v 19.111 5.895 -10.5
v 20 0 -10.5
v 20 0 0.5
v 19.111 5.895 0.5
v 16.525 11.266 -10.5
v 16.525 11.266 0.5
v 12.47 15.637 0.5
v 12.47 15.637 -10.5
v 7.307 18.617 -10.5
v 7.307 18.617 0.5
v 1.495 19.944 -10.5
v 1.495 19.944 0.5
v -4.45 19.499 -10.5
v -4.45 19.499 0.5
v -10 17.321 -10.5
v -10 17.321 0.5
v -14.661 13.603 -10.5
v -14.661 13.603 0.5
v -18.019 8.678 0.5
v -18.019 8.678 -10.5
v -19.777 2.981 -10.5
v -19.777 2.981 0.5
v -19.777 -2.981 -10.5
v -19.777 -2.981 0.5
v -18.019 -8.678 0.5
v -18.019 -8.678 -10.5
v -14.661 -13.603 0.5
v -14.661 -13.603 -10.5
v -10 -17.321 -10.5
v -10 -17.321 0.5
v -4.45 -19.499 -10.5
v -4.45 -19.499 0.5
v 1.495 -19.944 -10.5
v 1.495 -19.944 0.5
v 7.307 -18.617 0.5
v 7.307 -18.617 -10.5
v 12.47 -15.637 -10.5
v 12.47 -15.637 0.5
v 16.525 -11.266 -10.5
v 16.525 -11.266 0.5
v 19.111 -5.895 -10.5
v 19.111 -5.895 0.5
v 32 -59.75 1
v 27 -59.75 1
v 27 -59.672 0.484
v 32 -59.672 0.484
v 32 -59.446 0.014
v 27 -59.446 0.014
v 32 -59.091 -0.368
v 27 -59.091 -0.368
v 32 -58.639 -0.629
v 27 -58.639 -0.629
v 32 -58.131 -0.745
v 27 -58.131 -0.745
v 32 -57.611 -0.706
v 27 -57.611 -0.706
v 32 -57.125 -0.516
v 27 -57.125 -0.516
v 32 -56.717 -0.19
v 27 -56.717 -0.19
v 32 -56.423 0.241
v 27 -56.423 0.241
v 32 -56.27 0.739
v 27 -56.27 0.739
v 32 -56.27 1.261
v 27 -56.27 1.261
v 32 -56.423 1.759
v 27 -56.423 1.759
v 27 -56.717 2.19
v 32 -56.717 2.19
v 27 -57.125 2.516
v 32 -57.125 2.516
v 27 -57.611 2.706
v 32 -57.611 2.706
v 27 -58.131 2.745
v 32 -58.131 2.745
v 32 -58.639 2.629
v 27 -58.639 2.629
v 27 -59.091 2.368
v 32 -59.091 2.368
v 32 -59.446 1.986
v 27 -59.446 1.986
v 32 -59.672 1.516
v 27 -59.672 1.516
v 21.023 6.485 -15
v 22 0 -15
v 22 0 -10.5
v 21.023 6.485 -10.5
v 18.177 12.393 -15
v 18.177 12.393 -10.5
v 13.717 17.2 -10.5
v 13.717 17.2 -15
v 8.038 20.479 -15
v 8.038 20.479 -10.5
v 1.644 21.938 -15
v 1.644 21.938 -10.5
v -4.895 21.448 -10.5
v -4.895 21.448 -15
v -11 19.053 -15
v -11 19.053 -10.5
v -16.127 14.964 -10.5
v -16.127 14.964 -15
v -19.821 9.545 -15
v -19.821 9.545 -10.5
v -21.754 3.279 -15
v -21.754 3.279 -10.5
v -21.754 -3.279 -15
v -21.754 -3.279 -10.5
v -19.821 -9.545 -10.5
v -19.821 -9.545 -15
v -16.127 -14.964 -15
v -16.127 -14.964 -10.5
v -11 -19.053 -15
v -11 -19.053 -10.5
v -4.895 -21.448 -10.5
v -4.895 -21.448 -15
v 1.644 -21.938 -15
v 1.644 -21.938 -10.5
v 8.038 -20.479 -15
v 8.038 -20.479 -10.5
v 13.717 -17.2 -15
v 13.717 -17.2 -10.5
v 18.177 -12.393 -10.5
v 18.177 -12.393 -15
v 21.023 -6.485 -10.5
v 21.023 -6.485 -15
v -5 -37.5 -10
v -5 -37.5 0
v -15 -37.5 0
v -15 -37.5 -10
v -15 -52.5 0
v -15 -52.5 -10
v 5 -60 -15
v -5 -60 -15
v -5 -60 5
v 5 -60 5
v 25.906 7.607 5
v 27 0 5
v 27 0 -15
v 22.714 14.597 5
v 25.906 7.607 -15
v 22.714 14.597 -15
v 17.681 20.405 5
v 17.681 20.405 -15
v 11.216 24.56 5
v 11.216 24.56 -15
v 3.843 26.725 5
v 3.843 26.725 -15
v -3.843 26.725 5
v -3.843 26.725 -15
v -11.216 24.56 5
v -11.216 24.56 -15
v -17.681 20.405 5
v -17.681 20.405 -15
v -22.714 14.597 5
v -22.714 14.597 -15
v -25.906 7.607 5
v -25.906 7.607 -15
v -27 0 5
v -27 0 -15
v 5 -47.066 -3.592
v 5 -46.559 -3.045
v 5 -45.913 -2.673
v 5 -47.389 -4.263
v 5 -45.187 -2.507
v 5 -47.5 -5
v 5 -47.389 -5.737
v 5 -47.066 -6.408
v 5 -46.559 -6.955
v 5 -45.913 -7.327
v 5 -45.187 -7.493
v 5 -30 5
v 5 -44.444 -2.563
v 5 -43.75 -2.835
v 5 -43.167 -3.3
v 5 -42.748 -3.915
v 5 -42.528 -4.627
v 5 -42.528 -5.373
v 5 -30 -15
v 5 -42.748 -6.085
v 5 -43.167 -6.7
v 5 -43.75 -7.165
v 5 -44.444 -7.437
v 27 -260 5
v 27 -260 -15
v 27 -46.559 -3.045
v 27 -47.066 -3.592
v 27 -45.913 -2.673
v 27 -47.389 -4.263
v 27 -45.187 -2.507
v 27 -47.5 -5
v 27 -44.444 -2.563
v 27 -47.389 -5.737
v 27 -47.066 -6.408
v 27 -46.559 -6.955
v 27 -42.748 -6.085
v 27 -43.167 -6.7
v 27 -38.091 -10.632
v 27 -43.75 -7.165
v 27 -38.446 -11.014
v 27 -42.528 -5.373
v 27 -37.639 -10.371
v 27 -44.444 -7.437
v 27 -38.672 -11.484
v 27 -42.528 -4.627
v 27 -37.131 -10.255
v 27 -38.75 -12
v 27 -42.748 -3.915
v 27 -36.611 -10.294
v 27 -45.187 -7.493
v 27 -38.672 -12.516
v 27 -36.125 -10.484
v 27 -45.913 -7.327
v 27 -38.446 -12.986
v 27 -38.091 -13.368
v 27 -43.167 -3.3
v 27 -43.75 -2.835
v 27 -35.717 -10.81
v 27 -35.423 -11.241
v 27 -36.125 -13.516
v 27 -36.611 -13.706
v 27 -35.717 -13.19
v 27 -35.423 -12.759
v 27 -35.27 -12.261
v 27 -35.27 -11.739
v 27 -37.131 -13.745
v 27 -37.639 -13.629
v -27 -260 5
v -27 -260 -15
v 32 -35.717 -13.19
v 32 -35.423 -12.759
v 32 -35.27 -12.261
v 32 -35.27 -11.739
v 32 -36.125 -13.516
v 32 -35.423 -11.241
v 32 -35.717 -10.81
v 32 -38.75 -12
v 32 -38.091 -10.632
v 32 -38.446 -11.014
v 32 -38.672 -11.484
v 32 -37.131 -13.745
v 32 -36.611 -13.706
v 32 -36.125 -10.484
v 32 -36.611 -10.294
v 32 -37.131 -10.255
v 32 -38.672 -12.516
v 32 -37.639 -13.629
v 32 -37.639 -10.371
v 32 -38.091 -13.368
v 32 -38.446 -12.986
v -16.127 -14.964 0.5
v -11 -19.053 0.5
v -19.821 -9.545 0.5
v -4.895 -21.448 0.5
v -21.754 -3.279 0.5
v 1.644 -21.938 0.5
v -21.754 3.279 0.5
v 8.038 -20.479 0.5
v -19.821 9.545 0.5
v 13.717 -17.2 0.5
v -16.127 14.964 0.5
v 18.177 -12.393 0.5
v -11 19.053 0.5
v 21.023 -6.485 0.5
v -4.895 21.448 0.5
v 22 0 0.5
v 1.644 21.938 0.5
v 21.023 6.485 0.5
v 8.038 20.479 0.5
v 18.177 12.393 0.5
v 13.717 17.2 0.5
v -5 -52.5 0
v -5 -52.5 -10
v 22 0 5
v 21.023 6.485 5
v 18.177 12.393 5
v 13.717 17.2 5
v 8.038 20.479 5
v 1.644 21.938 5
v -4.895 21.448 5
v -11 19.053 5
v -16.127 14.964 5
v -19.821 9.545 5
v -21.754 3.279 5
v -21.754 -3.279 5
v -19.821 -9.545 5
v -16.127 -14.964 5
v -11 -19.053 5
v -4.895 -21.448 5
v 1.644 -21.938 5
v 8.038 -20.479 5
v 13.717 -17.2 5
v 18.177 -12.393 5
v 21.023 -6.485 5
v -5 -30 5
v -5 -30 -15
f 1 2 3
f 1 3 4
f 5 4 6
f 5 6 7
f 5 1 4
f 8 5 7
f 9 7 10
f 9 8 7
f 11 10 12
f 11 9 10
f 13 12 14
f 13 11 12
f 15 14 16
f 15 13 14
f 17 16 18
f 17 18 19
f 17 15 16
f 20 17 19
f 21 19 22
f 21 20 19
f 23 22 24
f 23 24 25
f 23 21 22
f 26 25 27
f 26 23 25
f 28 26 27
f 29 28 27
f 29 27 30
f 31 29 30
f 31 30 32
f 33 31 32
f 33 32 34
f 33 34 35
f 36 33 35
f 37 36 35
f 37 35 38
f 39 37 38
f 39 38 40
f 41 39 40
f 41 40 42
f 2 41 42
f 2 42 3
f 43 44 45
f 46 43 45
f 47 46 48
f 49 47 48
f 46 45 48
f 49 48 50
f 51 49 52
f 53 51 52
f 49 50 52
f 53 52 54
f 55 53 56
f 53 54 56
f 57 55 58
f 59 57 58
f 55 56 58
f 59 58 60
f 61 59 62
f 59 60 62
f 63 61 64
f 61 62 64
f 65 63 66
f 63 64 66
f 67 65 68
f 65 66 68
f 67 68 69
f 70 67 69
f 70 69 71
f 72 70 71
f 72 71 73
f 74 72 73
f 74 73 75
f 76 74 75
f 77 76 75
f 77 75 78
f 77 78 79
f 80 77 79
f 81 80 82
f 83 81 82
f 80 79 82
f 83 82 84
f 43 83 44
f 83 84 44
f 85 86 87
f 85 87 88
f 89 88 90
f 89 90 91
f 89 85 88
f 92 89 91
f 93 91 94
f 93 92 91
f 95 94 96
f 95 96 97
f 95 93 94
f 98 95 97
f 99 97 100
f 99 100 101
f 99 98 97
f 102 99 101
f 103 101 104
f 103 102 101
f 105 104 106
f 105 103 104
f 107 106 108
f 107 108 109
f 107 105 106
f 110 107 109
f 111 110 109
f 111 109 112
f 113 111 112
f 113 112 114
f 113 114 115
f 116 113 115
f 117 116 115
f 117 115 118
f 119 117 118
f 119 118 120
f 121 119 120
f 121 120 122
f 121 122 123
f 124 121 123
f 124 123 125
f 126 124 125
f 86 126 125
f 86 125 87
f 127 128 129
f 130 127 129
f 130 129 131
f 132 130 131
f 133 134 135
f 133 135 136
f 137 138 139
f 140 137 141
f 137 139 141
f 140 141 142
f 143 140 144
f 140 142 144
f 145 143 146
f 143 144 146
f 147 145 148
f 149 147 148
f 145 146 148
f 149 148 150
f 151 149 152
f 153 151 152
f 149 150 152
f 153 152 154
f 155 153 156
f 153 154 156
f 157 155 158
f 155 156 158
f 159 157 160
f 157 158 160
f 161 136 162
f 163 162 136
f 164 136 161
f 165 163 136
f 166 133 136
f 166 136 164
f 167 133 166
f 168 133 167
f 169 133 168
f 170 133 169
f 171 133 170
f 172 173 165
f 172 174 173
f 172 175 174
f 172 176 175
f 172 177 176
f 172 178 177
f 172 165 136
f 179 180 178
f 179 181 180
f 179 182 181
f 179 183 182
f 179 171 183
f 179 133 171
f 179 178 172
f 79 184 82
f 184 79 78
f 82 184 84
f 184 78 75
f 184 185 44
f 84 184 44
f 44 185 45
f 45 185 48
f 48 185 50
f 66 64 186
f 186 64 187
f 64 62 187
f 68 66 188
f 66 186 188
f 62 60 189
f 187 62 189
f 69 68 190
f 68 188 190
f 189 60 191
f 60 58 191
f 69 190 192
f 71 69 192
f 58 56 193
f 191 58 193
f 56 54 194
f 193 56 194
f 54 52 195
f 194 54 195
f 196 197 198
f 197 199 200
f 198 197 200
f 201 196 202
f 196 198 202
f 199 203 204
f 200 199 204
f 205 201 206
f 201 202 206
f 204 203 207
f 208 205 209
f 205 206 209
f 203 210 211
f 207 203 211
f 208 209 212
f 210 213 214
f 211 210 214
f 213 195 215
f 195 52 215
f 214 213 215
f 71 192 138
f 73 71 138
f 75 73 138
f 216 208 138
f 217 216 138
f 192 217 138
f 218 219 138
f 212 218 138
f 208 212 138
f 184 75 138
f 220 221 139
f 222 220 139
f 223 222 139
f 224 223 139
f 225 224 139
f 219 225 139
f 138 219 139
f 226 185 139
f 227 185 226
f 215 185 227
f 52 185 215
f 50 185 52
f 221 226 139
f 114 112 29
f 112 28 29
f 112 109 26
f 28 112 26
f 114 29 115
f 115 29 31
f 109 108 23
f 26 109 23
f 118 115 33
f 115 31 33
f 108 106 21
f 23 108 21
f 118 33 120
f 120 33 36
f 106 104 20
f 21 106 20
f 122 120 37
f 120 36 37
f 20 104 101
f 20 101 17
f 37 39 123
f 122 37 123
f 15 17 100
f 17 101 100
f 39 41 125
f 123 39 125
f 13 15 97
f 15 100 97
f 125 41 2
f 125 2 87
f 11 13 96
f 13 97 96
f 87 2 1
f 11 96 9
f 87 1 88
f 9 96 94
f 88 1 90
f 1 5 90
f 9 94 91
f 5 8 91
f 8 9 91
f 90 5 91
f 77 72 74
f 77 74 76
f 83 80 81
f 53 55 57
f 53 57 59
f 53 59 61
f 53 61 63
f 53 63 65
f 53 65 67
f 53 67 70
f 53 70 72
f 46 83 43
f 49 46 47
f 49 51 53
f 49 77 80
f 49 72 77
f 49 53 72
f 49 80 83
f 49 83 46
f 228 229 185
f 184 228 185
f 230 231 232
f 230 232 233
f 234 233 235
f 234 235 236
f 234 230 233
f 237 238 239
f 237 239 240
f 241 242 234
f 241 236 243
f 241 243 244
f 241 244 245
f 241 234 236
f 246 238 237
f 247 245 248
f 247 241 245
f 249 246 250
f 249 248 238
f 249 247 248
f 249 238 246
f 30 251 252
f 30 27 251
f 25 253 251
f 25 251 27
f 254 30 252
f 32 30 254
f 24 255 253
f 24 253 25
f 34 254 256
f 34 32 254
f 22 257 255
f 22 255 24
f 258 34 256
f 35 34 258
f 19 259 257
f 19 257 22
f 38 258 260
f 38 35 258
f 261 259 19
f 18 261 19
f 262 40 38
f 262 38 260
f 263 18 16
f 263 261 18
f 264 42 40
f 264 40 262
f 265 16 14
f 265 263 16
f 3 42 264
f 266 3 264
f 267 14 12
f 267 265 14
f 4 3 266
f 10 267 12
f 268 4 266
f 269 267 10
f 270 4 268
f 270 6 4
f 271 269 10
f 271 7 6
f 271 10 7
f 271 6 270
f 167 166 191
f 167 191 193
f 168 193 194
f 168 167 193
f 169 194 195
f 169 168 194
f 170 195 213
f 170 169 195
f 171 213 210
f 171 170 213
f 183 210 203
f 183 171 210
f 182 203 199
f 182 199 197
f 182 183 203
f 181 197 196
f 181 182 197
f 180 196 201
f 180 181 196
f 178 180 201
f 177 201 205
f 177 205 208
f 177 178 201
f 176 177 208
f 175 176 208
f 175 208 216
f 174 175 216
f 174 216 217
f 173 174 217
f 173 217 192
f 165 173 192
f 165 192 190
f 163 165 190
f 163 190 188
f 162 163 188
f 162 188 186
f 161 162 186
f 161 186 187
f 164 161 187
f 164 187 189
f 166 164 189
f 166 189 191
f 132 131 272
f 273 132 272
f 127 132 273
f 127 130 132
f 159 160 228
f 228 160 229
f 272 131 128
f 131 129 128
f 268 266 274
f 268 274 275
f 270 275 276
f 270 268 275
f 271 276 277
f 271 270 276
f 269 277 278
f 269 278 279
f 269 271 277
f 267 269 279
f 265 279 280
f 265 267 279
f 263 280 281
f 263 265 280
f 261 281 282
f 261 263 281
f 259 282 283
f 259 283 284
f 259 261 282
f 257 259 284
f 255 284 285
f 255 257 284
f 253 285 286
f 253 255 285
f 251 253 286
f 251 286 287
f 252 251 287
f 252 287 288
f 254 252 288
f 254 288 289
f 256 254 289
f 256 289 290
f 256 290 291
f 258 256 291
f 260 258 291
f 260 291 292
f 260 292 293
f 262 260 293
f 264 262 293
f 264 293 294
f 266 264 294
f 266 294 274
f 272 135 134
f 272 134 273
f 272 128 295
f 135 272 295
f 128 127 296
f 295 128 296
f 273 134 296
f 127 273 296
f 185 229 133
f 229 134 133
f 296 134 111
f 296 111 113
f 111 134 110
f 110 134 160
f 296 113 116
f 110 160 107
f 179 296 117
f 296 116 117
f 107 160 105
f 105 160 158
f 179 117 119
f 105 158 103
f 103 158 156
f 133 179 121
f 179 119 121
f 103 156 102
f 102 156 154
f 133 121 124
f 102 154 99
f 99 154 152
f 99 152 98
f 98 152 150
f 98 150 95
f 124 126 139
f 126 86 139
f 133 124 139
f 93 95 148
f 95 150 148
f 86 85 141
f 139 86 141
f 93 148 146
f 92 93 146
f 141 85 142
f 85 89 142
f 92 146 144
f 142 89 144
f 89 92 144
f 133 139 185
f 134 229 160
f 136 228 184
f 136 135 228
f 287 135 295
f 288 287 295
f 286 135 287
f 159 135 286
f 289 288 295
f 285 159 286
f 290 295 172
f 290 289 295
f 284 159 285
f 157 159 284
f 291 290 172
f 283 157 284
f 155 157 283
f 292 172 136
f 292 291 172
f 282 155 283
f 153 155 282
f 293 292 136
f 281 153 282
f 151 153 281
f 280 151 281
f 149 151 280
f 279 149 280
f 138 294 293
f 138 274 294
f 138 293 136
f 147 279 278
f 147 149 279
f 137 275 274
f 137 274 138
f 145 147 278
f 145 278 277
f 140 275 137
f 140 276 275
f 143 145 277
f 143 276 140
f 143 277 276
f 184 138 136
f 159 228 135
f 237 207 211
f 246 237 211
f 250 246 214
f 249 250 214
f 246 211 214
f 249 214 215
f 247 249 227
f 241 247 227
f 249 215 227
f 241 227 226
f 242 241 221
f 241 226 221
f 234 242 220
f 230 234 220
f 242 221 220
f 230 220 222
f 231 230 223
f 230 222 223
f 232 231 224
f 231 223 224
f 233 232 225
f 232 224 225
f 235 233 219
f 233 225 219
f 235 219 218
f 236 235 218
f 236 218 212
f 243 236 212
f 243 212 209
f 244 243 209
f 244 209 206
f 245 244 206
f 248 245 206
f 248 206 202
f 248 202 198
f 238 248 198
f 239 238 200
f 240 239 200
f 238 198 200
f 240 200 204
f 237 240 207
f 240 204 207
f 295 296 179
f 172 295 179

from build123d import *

# Parameters (mm, degrees)
SKETCH1_R               = 22
BOSS_EXTRUDE1_DEPTH     = 5
SKETCH2_R               = 22
SKETCH2_R_2             = 20
BOSS_EXTRUDE2_DEPTH     = 0.5
BOSS_EXTRUDE4_START     = -15
SKETCH1_2_R             = 22
BOSS_EXTRUDE4_DEPTH     = 15
BOSS_EXTRUDE5_START     = -10.5
SKETCH2_2_R             = 22
SKETCH2_2_R_2           = 20
BOSS_EXTRUDE5_DEPTH     = 10.5
CUT_EXTRUDE1_DEPTH      = 263.162163555
CUT_EXTRUDE1_DEPTH_BACK = 263.162163555
SKETCH6_W               = 10
SKETCH6_H               = 30
CUT_EXTRUDE2_DEPTH      = 10
SKETCH8_R               = 2.5
CUT_EXTRUDE3_DEPTH      = 27
SKETCH9_R               = 1.75
BOSS_EXTRUDE6_DEPTH     = 5


with BuildPart() as part:
    # Sketch1 → Boss-Extrude1 (new body)
    with BuildSketch(Plane.XY):
        with BuildLine():
            Line((-27, -260), (27, -260))
            Line((27, -260), (27, 0))
            ThreePointArc((27, 0), (0, 27), (-27, 0))
            Line((-27, 0), (-27, -260))
        make_face()
        Circle(SKETCH1_R, mode=Mode.SUBTRACT)
    extrude(amount=BOSS_EXTRUDE1_DEPTH)

    # Sketch2 → Boss-Extrude2 (add)
    with BuildSketch(Plane.XY):
        Circle(SKETCH2_R)
        Circle(SKETCH2_R_2, mode=Mode.SUBTRACT)
    extrude(amount=BOSS_EXTRUDE2_DEPTH)

    # Sketch1<2> → Boss-Extrude4 (add)
    with BuildSketch(Plane.XY.offset(BOSS_EXTRUDE4_START)):
        with BuildLine():
            Line((-27, -260), (27, -260))
            Line((27, -260), (27, 0))
            ThreePointArc((27, 0), (0, 27), (-27, 0))
            Line((-27, 0), (-27, -260))
        make_face()
        Circle(SKETCH1_2_R, mode=Mode.SUBTRACT)
    extrude(amount=BOSS_EXTRUDE4_DEPTH)

    # Sketch2<2> → Boss-Extrude5 (add)
    with BuildSketch(Plane.XY.offset(BOSS_EXTRUDE5_START)):
        Circle(SKETCH2_2_R)
        Circle(SKETCH2_2_R_2, mode=Mode.SUBTRACT)
    extrude(amount=BOSS_EXTRUDE5_DEPTH)

    # Sketch6 → Cut-Extrude1 (cut, two sides: drawn at the far end of the back side and taken through both)
    with BuildSketch(Plane.XY.offset(5).offset(-CUT_EXTRUDE1_DEPTH_BACK)):
        with Locations((0, -45)):
            Rectangle(SKETCH6_W, SKETCH6_H)
    extrude(amount=CUT_EXTRUDE1_DEPTH + CUT_EXTRUDE1_DEPTH_BACK, mode=Mode.SUBTRACT)

    # Sketch7 → Cut-Extrude2 (cut)
    with BuildSketch(Plane.XY):
        Polygon((-15, -52.5), (-5, -52.5), (-5, -47.5), (-5, -37.5), (-15, -37.5), align=None)
    extrude(amount=-CUT_EXTRUDE2_DEPTH, mode=Mode.SUBTRACT)

    # Sketch8 → Cut-Extrude3 (cut)
    with BuildSketch(Plane(origin=(0, 0, 0), x_dir=(0, 0, -1), z_dir=(1, 0, 0))):
        with Locations(Location((5, -45, 0), (0, 0, 270))):
            Circle(SKETCH8_R)
    extrude(amount=CUT_EXTRUDE3_DEPTH, mode=Mode.SUBTRACT)

    # Sketch9 → Boss-Extrude6 (add)
    with BuildSketch(Plane(origin=(27, 0, 0), x_dir=(0, 0, -1), z_dir=(1, 0, 0))):
        with Locations(Location((12, -37, 0), (0, 0, 270))):
            Circle(SKETCH9_R)
        with Locations(Location((-1, -58, 0), (0, 0, 270))):
            Circle(SKETCH9_R)
    extrude(amount=BOSS_EXTRUDE6_DEPTH)


solid = part.part
